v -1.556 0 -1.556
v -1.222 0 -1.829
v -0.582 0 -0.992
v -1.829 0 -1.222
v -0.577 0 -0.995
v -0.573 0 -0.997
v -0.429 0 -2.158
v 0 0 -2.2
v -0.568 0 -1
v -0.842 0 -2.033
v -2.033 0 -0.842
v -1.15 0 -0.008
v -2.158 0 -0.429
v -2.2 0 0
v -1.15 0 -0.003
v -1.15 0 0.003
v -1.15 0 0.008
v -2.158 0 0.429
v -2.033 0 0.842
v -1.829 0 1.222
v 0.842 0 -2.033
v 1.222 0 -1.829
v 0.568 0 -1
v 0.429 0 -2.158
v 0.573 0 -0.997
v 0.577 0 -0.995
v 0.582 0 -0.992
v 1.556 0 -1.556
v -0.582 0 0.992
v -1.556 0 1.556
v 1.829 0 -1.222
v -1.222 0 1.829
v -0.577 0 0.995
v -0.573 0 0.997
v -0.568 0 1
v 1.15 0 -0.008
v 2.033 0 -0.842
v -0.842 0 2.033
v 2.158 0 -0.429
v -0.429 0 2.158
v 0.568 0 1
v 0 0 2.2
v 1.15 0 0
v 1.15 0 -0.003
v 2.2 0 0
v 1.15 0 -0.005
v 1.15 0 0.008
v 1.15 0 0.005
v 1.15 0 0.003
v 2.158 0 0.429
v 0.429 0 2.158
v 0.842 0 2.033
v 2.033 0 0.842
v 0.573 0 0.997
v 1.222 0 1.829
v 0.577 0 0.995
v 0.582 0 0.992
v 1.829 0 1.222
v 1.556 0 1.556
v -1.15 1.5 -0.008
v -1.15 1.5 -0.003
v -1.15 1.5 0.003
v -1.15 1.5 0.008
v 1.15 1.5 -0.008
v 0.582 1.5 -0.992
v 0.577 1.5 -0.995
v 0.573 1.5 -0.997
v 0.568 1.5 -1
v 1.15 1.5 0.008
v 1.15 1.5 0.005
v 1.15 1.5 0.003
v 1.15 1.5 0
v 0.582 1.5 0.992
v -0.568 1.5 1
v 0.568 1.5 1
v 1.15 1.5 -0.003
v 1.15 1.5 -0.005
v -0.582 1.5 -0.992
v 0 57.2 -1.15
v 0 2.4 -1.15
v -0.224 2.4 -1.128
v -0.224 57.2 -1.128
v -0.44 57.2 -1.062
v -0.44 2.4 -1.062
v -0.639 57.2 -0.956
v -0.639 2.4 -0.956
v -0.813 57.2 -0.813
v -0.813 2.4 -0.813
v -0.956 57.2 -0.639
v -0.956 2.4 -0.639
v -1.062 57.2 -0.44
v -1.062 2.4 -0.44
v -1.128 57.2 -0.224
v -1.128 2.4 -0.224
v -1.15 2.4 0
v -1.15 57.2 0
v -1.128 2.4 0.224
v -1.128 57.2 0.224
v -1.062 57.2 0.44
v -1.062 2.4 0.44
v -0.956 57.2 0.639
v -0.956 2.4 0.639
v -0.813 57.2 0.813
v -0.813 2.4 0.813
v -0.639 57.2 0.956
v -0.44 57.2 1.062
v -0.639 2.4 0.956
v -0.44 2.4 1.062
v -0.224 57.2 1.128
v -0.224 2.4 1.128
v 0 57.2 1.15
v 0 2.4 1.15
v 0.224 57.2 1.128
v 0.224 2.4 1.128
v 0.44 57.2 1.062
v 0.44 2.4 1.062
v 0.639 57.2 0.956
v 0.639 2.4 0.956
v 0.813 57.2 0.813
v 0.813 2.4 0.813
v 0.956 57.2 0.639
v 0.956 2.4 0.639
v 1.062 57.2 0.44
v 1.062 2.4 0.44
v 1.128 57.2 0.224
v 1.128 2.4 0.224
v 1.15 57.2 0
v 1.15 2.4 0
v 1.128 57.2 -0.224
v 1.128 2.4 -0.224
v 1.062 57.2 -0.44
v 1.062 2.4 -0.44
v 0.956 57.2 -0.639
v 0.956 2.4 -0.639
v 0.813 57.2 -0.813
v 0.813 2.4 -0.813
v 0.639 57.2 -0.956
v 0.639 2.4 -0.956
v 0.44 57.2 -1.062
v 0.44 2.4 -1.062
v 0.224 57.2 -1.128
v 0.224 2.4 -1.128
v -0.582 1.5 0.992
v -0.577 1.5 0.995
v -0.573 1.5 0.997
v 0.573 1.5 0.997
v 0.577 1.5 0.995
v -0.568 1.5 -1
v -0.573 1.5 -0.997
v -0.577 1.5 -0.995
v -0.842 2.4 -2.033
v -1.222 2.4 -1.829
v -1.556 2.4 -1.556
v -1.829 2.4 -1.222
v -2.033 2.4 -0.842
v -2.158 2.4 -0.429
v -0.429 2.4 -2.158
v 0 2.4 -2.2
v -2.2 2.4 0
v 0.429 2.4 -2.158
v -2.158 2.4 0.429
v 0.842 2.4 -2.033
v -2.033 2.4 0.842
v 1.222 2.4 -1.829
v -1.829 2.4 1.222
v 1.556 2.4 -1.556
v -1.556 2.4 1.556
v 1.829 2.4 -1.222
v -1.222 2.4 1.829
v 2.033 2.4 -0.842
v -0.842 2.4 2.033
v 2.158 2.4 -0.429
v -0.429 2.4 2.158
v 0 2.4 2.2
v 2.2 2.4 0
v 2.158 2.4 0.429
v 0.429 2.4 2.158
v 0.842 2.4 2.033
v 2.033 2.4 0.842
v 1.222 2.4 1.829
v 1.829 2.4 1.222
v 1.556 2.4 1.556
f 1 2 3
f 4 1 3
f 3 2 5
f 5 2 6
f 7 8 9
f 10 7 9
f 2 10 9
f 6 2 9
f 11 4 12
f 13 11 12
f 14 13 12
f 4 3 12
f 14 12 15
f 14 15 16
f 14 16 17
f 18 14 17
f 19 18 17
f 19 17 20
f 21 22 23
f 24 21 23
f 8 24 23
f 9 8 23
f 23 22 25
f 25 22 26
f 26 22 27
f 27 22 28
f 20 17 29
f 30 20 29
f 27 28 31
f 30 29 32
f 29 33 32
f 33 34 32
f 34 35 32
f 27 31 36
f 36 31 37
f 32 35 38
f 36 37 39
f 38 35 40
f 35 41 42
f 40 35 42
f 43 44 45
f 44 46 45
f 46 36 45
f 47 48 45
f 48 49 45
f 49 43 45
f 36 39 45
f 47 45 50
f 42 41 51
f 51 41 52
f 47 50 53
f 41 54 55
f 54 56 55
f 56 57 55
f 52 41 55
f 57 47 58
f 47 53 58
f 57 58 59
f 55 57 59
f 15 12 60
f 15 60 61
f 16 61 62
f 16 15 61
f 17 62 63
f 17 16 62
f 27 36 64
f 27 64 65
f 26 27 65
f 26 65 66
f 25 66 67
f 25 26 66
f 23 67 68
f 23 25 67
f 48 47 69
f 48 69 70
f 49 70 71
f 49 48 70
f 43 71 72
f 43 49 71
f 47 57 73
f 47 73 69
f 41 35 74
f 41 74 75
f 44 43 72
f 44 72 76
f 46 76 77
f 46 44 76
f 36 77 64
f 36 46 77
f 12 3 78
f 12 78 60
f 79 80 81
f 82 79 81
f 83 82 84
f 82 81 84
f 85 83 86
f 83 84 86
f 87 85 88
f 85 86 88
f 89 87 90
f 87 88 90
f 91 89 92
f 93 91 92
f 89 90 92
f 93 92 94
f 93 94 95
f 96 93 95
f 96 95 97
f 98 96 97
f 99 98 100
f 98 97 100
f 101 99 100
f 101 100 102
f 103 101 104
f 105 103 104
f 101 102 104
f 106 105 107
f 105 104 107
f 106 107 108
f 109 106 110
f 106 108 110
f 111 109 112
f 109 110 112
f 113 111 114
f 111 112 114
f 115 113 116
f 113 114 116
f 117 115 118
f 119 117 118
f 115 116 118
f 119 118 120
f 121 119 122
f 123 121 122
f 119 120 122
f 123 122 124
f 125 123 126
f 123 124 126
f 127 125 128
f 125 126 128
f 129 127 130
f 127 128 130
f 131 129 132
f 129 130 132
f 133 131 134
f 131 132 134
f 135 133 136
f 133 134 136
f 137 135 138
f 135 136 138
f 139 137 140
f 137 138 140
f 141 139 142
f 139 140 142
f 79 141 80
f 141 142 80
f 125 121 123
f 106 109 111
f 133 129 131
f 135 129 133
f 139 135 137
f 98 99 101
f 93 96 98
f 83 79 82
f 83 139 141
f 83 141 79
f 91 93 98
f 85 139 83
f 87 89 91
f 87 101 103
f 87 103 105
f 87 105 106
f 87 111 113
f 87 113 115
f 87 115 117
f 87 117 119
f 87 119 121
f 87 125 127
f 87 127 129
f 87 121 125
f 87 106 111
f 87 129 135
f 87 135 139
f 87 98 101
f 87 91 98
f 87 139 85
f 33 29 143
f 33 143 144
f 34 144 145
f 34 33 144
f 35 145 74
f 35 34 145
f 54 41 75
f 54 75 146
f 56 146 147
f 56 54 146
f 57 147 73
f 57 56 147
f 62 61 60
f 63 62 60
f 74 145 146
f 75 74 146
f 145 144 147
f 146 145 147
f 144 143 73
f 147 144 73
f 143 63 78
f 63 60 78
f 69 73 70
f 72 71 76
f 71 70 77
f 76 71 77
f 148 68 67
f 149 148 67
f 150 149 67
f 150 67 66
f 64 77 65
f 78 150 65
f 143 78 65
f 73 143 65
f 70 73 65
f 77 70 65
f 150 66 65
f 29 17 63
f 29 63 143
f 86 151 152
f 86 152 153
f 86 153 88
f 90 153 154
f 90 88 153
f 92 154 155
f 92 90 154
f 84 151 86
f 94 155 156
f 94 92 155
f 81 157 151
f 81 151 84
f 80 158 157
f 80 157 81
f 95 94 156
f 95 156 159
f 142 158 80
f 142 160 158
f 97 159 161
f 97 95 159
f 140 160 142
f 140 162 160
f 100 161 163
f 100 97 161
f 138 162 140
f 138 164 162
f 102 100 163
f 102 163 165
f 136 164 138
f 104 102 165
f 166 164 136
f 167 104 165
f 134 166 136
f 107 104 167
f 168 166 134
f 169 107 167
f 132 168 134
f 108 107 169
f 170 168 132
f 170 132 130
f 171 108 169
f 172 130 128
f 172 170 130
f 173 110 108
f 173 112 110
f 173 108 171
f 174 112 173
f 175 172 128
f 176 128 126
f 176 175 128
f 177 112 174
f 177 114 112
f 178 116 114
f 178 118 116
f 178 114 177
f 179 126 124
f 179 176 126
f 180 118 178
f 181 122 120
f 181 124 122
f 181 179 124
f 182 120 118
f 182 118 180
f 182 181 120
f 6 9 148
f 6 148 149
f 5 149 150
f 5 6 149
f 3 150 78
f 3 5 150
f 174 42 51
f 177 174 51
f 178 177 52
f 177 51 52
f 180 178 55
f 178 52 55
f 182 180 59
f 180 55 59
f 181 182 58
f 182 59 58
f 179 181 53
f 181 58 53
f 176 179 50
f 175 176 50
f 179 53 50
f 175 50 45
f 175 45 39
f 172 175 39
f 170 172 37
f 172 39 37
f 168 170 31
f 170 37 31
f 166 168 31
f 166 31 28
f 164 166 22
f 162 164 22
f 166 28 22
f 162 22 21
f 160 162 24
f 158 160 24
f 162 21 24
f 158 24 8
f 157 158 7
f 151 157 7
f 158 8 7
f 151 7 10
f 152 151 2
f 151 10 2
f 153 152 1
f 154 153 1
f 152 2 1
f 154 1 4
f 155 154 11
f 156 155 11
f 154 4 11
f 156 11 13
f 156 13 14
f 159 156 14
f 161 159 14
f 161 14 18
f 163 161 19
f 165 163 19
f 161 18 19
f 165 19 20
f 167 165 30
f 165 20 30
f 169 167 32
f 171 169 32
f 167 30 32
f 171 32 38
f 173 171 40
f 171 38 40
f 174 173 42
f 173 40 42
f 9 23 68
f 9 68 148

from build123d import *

# Parameters (mm, degrees)
SKETCH_1_R          = 2.2
EXTRUDE_1_DEPTH     = 2.4
EXTRUDE_START       = 2.4
SKETCH_1_4_R        = 1.15
EXTRUDE_2_DEPTH     = 54.8
CUT_EXTRUDE_1_DEPTH = 1.5


with BuildPart() as part:
    # 草图1 → 凸台-拉伸1 (new body)
    with BuildSketch(Plane(origin=(0, 0, 0), x_dir=(1, 0, 0), z_dir=(0, 1, 0))):
        with Locations(Location((0, 0, 0), (0, 0, 270))):
            Circle(SKETCH_1_R)
    extrude(amount=EXTRUDE_1_DEPTH)

    # 草图1<4> → 凸台-拉伸2 (add)
    with BuildSketch(Plane(origin=(0, 0, 0), x_dir=(1, 0, 0), z_dir=(0, 1, 0)).offset(EXTRUDE_START)):
        with Locations(Location((0, 0, 0), (0, 0, 90))):
            Circle(SKETCH_1_4_R)
    extrude(amount=EXTRUDE_2_DEPTH)

    # 草图1<3> → 切除-拉伸1 (cut)
    with BuildSketch(Plane(origin=(0, 0, 0), x_dir=(1, 0, 0), z_dir=(0, 1, 0))):
        with BuildLine():
            ThreePointArc((1.15, 0), (1.149992705, 0.004096081), (1.149970821, 0.008192111))
            Line((1.149970821, 0.008192111), (0.582079986, 0.991807889))
            ThreePointArc((0.582079986, 0.991807889), (0.575, 0.995929214), (0.567890835, 1))
            Line((0.567890835, 1), (-0.567890835, 1))
            ThreePointArc((-0.567890835, 1), (-0.575, 0.995929214), (-0.582079986, 0.991807889))
            Line((-0.582079986, 0.991807889), (-1.149970821, 0.008192111))
            ThreePointArc((-1.149970821, 0.008192111), (-1.15, 0), (-1.149970821, -0.008192111))
            Line((-1.149970821, -0.008192111), (-0.582079986, -0.991807889))
            ThreePointArc((-0.582079986, -0.991807889), (-0.575, -0.995929214), (-0.567890835, -1))
            Line((-0.567890835, -1), (0.567890835, -1))
            ThreePointArc((0.567890835, -1), (0.575, -0.995929214), (0.582079986, -0.991807889))
            Line((0.582079986, -0.991807889), (1.149970821, -0.008192111))
            ThreePointArc((1.149970821, -0.008192111), (1.149992705, -0.004096081), (1.15, 0))
        make_face()
    extrude(amount=CUT_EXTRUDE_1_DEPTH, mode=Mode.SUBTRACT)


solid = part.part
